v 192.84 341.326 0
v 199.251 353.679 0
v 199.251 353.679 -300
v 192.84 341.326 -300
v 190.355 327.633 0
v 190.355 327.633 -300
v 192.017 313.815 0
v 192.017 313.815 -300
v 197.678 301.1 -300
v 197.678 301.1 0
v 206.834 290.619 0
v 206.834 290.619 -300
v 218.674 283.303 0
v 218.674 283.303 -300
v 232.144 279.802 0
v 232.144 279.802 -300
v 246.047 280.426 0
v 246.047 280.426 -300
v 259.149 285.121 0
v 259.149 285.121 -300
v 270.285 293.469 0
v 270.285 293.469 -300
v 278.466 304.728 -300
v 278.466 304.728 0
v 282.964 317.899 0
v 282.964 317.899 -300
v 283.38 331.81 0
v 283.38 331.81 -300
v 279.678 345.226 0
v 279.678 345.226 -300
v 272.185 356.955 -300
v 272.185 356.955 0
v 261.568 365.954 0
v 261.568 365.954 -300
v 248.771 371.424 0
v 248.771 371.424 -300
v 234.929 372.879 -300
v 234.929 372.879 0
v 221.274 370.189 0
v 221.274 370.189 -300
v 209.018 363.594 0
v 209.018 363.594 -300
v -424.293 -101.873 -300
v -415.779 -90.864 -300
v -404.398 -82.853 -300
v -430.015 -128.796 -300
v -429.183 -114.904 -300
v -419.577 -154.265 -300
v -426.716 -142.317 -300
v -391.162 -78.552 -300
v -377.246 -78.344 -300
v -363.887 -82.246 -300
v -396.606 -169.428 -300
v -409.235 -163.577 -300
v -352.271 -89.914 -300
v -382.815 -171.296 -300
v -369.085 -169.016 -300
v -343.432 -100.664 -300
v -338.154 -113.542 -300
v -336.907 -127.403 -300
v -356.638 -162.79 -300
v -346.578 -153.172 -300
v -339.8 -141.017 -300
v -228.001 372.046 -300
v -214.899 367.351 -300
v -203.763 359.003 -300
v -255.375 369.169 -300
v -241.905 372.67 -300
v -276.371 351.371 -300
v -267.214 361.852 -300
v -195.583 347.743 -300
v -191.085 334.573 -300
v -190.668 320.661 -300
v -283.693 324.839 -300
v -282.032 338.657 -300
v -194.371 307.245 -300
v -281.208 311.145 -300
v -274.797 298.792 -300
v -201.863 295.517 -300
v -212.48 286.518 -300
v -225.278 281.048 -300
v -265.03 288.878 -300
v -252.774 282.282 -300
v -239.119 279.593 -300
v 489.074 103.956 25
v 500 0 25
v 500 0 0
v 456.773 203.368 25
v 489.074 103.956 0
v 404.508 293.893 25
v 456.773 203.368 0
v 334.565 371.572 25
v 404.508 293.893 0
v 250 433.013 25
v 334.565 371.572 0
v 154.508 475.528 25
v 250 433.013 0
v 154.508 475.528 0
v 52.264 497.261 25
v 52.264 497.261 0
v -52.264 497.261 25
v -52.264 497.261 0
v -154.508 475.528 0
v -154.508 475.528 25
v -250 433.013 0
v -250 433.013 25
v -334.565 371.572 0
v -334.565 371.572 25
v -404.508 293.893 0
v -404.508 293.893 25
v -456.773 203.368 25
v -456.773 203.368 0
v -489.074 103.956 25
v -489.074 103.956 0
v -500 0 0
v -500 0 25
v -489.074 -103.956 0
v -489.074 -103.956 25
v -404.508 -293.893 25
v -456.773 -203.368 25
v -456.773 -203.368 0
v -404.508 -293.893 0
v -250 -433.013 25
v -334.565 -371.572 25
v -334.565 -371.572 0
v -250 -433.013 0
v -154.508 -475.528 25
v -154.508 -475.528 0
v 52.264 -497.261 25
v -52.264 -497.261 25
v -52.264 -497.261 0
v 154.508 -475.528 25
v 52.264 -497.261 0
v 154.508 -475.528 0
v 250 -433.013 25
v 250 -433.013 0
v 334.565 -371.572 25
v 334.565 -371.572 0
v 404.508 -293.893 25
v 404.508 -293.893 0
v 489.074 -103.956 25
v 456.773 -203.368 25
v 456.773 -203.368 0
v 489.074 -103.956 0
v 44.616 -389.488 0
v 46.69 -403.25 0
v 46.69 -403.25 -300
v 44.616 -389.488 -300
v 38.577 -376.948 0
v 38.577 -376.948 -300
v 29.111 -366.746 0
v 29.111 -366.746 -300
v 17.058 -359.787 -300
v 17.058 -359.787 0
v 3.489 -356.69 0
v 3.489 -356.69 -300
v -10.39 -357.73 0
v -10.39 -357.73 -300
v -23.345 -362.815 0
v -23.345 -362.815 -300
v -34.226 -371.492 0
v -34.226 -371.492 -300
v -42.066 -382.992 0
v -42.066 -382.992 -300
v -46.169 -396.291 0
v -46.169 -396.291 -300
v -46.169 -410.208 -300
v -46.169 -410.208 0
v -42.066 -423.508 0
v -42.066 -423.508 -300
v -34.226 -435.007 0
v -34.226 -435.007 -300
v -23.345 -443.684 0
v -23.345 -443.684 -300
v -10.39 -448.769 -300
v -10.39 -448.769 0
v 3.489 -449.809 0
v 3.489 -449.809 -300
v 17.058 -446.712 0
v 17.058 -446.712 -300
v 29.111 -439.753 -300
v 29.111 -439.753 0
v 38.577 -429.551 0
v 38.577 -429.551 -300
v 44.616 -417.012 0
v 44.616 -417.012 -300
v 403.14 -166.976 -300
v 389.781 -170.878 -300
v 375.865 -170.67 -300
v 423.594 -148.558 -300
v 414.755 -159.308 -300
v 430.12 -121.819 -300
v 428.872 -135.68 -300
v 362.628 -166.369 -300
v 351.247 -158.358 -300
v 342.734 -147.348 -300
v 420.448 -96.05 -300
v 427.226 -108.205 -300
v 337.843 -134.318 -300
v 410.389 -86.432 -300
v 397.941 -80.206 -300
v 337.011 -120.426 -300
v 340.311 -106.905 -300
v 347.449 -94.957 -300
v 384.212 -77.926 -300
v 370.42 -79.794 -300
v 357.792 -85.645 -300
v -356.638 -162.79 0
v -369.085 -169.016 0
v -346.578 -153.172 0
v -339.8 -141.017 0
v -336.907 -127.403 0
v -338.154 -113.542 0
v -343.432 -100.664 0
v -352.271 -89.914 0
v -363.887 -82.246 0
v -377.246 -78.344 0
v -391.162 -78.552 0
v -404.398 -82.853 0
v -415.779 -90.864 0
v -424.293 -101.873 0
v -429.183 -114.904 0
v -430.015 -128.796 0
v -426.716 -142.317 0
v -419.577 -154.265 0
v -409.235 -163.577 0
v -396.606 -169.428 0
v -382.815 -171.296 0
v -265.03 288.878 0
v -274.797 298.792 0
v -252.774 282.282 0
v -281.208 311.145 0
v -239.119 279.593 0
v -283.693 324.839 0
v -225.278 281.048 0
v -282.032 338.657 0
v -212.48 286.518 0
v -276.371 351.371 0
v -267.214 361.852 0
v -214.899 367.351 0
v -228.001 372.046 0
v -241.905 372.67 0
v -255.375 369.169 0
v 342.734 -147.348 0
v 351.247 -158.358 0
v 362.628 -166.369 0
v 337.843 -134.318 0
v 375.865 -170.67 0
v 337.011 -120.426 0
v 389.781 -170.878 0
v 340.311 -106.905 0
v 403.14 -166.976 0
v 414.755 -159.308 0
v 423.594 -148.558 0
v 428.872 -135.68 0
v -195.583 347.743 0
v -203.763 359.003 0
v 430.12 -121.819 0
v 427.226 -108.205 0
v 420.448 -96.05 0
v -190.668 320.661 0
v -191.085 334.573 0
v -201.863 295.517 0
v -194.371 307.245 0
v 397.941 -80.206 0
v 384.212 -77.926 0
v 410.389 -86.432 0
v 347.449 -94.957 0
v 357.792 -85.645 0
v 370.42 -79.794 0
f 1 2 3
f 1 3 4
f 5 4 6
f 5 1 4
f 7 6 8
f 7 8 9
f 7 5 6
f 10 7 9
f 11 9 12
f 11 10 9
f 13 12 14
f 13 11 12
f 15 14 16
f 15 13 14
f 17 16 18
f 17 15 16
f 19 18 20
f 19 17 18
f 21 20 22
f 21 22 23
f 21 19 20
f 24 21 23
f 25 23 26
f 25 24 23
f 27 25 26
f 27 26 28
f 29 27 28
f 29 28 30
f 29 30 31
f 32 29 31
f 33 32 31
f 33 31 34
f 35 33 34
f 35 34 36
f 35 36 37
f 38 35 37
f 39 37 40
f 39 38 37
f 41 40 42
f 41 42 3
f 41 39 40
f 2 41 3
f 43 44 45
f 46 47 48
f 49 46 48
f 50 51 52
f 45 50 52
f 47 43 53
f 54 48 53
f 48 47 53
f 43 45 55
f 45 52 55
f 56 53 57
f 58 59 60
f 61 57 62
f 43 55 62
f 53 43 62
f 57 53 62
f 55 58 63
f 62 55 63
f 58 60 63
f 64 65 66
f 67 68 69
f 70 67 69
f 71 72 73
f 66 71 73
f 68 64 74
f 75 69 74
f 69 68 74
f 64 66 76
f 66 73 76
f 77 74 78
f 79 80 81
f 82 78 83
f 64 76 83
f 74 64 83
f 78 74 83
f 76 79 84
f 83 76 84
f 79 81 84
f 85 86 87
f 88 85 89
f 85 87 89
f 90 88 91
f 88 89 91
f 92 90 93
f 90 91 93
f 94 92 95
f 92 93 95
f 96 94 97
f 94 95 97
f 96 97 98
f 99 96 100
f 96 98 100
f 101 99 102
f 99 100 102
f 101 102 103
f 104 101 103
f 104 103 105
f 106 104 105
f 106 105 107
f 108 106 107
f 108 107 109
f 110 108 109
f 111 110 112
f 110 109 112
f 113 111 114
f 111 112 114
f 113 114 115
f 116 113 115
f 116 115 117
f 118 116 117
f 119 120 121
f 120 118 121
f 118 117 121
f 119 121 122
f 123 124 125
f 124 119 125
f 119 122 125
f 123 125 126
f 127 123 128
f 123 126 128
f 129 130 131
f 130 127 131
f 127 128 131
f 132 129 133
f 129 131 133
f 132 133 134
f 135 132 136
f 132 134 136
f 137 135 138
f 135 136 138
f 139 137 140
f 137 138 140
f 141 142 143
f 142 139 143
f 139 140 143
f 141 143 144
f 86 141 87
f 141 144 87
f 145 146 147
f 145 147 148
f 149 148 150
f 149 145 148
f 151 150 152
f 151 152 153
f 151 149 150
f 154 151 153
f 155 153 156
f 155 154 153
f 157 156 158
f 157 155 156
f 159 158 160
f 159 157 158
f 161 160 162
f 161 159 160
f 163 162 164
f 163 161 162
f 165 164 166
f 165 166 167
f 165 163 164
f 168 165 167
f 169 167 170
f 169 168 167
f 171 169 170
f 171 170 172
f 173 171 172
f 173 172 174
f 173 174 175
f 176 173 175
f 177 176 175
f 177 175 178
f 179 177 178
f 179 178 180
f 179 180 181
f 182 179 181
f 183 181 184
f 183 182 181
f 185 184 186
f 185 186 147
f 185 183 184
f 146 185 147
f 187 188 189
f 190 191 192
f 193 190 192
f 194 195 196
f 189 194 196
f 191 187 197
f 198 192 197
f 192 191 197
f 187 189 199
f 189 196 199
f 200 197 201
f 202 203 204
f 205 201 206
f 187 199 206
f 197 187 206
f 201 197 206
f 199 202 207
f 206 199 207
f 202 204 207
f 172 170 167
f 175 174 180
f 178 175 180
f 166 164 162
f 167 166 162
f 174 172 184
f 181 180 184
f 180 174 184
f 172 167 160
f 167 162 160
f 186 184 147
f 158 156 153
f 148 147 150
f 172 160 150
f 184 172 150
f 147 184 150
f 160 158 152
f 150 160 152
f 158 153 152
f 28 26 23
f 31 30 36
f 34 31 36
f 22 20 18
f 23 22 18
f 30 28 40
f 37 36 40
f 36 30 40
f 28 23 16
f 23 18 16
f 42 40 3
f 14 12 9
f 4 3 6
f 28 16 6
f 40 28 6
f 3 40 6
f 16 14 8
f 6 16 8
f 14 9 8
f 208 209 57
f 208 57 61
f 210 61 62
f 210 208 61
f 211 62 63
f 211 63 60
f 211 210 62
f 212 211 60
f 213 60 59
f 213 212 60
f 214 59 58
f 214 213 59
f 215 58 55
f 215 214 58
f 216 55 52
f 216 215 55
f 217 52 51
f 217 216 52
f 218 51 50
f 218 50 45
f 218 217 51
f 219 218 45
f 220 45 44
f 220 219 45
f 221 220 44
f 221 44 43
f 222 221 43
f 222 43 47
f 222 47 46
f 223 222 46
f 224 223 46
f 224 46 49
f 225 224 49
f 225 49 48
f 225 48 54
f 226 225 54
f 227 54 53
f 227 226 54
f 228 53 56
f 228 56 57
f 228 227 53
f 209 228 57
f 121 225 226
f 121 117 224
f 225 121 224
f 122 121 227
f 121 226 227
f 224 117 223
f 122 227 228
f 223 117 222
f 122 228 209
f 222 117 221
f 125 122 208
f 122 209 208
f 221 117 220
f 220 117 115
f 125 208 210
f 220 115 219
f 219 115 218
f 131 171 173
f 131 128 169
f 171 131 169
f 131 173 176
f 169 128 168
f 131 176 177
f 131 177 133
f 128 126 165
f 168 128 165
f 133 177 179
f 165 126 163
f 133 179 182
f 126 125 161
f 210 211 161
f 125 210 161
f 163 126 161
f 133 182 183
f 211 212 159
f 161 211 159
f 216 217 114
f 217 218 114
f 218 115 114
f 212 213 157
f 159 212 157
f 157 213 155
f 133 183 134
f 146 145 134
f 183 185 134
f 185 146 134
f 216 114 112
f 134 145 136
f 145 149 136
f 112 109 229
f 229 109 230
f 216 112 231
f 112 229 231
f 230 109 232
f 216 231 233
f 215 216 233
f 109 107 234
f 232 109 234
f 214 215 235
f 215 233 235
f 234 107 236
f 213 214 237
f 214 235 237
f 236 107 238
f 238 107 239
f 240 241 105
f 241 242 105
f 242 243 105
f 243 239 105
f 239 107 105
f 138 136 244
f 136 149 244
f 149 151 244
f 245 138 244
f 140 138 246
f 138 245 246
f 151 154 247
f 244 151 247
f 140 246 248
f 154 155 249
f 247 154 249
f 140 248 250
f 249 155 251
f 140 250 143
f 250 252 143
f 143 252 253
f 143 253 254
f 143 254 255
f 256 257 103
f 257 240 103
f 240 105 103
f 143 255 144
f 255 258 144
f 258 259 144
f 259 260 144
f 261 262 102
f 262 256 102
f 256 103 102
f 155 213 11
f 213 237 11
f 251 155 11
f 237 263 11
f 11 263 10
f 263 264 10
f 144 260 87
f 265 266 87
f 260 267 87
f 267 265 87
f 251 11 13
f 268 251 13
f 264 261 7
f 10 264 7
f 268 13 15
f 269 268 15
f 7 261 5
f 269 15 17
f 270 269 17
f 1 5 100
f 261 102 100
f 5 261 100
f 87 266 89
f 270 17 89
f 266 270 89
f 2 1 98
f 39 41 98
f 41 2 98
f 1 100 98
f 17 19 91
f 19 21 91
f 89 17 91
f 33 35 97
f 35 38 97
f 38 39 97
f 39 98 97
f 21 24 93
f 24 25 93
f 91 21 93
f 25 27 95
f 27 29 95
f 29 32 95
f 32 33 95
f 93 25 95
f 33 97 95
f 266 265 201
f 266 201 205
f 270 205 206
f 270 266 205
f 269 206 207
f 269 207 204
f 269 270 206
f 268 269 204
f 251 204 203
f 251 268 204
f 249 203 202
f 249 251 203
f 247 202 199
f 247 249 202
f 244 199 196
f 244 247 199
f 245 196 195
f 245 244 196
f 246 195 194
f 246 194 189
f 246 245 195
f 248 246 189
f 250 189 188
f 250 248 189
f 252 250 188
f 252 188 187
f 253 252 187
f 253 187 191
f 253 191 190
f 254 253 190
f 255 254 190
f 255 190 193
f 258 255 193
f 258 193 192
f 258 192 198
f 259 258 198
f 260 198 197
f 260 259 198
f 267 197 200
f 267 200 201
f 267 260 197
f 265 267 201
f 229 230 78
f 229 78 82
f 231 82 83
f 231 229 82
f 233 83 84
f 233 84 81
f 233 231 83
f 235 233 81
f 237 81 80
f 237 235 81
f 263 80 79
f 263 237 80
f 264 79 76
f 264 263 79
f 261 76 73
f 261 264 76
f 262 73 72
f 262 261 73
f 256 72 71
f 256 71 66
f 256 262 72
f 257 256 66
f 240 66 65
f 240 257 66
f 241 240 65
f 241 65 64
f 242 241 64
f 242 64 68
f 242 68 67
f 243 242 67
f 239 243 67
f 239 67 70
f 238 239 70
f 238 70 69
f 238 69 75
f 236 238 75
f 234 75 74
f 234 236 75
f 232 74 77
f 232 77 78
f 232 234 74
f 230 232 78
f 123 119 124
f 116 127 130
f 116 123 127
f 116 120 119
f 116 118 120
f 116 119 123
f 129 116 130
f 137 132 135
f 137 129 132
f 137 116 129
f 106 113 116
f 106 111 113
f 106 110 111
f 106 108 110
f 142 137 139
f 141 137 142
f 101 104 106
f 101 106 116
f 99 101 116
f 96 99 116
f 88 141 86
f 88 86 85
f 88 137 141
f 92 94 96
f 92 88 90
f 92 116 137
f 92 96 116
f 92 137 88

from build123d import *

# Parameters (mm, degrees)
F0_R     = 500
F2_DEPTH = 25
F1_R     = 46.69
F3_DEPTH = 300
F4_COUNT = 5


with BuildPart() as f2:
    # F0 (on Top) → F2 (new body)
    with BuildSketch(Plane.XY):
        Circle(F0_R)
    extrude(amount=F2_DEPTH)

    # F1 (on face) → F3 (join)
    with BuildSketch(Plane.XY):
        with Locations((0, -403.2496213913)):
            Circle(F1_R)
    extrude(amount=-F3_DEPTH)

    # F4: F2 ×5 about axis
    f4_axis = Axis((0, 0, 0), (0, 0, 1))


with BuildPart() as f2_1:
    add(f2.part)
    for i in range(1, F4_COUNT):
        add(f2.part.rotate(f4_axis, i * 360 / F4_COUNT))


solid = f2_1.part
